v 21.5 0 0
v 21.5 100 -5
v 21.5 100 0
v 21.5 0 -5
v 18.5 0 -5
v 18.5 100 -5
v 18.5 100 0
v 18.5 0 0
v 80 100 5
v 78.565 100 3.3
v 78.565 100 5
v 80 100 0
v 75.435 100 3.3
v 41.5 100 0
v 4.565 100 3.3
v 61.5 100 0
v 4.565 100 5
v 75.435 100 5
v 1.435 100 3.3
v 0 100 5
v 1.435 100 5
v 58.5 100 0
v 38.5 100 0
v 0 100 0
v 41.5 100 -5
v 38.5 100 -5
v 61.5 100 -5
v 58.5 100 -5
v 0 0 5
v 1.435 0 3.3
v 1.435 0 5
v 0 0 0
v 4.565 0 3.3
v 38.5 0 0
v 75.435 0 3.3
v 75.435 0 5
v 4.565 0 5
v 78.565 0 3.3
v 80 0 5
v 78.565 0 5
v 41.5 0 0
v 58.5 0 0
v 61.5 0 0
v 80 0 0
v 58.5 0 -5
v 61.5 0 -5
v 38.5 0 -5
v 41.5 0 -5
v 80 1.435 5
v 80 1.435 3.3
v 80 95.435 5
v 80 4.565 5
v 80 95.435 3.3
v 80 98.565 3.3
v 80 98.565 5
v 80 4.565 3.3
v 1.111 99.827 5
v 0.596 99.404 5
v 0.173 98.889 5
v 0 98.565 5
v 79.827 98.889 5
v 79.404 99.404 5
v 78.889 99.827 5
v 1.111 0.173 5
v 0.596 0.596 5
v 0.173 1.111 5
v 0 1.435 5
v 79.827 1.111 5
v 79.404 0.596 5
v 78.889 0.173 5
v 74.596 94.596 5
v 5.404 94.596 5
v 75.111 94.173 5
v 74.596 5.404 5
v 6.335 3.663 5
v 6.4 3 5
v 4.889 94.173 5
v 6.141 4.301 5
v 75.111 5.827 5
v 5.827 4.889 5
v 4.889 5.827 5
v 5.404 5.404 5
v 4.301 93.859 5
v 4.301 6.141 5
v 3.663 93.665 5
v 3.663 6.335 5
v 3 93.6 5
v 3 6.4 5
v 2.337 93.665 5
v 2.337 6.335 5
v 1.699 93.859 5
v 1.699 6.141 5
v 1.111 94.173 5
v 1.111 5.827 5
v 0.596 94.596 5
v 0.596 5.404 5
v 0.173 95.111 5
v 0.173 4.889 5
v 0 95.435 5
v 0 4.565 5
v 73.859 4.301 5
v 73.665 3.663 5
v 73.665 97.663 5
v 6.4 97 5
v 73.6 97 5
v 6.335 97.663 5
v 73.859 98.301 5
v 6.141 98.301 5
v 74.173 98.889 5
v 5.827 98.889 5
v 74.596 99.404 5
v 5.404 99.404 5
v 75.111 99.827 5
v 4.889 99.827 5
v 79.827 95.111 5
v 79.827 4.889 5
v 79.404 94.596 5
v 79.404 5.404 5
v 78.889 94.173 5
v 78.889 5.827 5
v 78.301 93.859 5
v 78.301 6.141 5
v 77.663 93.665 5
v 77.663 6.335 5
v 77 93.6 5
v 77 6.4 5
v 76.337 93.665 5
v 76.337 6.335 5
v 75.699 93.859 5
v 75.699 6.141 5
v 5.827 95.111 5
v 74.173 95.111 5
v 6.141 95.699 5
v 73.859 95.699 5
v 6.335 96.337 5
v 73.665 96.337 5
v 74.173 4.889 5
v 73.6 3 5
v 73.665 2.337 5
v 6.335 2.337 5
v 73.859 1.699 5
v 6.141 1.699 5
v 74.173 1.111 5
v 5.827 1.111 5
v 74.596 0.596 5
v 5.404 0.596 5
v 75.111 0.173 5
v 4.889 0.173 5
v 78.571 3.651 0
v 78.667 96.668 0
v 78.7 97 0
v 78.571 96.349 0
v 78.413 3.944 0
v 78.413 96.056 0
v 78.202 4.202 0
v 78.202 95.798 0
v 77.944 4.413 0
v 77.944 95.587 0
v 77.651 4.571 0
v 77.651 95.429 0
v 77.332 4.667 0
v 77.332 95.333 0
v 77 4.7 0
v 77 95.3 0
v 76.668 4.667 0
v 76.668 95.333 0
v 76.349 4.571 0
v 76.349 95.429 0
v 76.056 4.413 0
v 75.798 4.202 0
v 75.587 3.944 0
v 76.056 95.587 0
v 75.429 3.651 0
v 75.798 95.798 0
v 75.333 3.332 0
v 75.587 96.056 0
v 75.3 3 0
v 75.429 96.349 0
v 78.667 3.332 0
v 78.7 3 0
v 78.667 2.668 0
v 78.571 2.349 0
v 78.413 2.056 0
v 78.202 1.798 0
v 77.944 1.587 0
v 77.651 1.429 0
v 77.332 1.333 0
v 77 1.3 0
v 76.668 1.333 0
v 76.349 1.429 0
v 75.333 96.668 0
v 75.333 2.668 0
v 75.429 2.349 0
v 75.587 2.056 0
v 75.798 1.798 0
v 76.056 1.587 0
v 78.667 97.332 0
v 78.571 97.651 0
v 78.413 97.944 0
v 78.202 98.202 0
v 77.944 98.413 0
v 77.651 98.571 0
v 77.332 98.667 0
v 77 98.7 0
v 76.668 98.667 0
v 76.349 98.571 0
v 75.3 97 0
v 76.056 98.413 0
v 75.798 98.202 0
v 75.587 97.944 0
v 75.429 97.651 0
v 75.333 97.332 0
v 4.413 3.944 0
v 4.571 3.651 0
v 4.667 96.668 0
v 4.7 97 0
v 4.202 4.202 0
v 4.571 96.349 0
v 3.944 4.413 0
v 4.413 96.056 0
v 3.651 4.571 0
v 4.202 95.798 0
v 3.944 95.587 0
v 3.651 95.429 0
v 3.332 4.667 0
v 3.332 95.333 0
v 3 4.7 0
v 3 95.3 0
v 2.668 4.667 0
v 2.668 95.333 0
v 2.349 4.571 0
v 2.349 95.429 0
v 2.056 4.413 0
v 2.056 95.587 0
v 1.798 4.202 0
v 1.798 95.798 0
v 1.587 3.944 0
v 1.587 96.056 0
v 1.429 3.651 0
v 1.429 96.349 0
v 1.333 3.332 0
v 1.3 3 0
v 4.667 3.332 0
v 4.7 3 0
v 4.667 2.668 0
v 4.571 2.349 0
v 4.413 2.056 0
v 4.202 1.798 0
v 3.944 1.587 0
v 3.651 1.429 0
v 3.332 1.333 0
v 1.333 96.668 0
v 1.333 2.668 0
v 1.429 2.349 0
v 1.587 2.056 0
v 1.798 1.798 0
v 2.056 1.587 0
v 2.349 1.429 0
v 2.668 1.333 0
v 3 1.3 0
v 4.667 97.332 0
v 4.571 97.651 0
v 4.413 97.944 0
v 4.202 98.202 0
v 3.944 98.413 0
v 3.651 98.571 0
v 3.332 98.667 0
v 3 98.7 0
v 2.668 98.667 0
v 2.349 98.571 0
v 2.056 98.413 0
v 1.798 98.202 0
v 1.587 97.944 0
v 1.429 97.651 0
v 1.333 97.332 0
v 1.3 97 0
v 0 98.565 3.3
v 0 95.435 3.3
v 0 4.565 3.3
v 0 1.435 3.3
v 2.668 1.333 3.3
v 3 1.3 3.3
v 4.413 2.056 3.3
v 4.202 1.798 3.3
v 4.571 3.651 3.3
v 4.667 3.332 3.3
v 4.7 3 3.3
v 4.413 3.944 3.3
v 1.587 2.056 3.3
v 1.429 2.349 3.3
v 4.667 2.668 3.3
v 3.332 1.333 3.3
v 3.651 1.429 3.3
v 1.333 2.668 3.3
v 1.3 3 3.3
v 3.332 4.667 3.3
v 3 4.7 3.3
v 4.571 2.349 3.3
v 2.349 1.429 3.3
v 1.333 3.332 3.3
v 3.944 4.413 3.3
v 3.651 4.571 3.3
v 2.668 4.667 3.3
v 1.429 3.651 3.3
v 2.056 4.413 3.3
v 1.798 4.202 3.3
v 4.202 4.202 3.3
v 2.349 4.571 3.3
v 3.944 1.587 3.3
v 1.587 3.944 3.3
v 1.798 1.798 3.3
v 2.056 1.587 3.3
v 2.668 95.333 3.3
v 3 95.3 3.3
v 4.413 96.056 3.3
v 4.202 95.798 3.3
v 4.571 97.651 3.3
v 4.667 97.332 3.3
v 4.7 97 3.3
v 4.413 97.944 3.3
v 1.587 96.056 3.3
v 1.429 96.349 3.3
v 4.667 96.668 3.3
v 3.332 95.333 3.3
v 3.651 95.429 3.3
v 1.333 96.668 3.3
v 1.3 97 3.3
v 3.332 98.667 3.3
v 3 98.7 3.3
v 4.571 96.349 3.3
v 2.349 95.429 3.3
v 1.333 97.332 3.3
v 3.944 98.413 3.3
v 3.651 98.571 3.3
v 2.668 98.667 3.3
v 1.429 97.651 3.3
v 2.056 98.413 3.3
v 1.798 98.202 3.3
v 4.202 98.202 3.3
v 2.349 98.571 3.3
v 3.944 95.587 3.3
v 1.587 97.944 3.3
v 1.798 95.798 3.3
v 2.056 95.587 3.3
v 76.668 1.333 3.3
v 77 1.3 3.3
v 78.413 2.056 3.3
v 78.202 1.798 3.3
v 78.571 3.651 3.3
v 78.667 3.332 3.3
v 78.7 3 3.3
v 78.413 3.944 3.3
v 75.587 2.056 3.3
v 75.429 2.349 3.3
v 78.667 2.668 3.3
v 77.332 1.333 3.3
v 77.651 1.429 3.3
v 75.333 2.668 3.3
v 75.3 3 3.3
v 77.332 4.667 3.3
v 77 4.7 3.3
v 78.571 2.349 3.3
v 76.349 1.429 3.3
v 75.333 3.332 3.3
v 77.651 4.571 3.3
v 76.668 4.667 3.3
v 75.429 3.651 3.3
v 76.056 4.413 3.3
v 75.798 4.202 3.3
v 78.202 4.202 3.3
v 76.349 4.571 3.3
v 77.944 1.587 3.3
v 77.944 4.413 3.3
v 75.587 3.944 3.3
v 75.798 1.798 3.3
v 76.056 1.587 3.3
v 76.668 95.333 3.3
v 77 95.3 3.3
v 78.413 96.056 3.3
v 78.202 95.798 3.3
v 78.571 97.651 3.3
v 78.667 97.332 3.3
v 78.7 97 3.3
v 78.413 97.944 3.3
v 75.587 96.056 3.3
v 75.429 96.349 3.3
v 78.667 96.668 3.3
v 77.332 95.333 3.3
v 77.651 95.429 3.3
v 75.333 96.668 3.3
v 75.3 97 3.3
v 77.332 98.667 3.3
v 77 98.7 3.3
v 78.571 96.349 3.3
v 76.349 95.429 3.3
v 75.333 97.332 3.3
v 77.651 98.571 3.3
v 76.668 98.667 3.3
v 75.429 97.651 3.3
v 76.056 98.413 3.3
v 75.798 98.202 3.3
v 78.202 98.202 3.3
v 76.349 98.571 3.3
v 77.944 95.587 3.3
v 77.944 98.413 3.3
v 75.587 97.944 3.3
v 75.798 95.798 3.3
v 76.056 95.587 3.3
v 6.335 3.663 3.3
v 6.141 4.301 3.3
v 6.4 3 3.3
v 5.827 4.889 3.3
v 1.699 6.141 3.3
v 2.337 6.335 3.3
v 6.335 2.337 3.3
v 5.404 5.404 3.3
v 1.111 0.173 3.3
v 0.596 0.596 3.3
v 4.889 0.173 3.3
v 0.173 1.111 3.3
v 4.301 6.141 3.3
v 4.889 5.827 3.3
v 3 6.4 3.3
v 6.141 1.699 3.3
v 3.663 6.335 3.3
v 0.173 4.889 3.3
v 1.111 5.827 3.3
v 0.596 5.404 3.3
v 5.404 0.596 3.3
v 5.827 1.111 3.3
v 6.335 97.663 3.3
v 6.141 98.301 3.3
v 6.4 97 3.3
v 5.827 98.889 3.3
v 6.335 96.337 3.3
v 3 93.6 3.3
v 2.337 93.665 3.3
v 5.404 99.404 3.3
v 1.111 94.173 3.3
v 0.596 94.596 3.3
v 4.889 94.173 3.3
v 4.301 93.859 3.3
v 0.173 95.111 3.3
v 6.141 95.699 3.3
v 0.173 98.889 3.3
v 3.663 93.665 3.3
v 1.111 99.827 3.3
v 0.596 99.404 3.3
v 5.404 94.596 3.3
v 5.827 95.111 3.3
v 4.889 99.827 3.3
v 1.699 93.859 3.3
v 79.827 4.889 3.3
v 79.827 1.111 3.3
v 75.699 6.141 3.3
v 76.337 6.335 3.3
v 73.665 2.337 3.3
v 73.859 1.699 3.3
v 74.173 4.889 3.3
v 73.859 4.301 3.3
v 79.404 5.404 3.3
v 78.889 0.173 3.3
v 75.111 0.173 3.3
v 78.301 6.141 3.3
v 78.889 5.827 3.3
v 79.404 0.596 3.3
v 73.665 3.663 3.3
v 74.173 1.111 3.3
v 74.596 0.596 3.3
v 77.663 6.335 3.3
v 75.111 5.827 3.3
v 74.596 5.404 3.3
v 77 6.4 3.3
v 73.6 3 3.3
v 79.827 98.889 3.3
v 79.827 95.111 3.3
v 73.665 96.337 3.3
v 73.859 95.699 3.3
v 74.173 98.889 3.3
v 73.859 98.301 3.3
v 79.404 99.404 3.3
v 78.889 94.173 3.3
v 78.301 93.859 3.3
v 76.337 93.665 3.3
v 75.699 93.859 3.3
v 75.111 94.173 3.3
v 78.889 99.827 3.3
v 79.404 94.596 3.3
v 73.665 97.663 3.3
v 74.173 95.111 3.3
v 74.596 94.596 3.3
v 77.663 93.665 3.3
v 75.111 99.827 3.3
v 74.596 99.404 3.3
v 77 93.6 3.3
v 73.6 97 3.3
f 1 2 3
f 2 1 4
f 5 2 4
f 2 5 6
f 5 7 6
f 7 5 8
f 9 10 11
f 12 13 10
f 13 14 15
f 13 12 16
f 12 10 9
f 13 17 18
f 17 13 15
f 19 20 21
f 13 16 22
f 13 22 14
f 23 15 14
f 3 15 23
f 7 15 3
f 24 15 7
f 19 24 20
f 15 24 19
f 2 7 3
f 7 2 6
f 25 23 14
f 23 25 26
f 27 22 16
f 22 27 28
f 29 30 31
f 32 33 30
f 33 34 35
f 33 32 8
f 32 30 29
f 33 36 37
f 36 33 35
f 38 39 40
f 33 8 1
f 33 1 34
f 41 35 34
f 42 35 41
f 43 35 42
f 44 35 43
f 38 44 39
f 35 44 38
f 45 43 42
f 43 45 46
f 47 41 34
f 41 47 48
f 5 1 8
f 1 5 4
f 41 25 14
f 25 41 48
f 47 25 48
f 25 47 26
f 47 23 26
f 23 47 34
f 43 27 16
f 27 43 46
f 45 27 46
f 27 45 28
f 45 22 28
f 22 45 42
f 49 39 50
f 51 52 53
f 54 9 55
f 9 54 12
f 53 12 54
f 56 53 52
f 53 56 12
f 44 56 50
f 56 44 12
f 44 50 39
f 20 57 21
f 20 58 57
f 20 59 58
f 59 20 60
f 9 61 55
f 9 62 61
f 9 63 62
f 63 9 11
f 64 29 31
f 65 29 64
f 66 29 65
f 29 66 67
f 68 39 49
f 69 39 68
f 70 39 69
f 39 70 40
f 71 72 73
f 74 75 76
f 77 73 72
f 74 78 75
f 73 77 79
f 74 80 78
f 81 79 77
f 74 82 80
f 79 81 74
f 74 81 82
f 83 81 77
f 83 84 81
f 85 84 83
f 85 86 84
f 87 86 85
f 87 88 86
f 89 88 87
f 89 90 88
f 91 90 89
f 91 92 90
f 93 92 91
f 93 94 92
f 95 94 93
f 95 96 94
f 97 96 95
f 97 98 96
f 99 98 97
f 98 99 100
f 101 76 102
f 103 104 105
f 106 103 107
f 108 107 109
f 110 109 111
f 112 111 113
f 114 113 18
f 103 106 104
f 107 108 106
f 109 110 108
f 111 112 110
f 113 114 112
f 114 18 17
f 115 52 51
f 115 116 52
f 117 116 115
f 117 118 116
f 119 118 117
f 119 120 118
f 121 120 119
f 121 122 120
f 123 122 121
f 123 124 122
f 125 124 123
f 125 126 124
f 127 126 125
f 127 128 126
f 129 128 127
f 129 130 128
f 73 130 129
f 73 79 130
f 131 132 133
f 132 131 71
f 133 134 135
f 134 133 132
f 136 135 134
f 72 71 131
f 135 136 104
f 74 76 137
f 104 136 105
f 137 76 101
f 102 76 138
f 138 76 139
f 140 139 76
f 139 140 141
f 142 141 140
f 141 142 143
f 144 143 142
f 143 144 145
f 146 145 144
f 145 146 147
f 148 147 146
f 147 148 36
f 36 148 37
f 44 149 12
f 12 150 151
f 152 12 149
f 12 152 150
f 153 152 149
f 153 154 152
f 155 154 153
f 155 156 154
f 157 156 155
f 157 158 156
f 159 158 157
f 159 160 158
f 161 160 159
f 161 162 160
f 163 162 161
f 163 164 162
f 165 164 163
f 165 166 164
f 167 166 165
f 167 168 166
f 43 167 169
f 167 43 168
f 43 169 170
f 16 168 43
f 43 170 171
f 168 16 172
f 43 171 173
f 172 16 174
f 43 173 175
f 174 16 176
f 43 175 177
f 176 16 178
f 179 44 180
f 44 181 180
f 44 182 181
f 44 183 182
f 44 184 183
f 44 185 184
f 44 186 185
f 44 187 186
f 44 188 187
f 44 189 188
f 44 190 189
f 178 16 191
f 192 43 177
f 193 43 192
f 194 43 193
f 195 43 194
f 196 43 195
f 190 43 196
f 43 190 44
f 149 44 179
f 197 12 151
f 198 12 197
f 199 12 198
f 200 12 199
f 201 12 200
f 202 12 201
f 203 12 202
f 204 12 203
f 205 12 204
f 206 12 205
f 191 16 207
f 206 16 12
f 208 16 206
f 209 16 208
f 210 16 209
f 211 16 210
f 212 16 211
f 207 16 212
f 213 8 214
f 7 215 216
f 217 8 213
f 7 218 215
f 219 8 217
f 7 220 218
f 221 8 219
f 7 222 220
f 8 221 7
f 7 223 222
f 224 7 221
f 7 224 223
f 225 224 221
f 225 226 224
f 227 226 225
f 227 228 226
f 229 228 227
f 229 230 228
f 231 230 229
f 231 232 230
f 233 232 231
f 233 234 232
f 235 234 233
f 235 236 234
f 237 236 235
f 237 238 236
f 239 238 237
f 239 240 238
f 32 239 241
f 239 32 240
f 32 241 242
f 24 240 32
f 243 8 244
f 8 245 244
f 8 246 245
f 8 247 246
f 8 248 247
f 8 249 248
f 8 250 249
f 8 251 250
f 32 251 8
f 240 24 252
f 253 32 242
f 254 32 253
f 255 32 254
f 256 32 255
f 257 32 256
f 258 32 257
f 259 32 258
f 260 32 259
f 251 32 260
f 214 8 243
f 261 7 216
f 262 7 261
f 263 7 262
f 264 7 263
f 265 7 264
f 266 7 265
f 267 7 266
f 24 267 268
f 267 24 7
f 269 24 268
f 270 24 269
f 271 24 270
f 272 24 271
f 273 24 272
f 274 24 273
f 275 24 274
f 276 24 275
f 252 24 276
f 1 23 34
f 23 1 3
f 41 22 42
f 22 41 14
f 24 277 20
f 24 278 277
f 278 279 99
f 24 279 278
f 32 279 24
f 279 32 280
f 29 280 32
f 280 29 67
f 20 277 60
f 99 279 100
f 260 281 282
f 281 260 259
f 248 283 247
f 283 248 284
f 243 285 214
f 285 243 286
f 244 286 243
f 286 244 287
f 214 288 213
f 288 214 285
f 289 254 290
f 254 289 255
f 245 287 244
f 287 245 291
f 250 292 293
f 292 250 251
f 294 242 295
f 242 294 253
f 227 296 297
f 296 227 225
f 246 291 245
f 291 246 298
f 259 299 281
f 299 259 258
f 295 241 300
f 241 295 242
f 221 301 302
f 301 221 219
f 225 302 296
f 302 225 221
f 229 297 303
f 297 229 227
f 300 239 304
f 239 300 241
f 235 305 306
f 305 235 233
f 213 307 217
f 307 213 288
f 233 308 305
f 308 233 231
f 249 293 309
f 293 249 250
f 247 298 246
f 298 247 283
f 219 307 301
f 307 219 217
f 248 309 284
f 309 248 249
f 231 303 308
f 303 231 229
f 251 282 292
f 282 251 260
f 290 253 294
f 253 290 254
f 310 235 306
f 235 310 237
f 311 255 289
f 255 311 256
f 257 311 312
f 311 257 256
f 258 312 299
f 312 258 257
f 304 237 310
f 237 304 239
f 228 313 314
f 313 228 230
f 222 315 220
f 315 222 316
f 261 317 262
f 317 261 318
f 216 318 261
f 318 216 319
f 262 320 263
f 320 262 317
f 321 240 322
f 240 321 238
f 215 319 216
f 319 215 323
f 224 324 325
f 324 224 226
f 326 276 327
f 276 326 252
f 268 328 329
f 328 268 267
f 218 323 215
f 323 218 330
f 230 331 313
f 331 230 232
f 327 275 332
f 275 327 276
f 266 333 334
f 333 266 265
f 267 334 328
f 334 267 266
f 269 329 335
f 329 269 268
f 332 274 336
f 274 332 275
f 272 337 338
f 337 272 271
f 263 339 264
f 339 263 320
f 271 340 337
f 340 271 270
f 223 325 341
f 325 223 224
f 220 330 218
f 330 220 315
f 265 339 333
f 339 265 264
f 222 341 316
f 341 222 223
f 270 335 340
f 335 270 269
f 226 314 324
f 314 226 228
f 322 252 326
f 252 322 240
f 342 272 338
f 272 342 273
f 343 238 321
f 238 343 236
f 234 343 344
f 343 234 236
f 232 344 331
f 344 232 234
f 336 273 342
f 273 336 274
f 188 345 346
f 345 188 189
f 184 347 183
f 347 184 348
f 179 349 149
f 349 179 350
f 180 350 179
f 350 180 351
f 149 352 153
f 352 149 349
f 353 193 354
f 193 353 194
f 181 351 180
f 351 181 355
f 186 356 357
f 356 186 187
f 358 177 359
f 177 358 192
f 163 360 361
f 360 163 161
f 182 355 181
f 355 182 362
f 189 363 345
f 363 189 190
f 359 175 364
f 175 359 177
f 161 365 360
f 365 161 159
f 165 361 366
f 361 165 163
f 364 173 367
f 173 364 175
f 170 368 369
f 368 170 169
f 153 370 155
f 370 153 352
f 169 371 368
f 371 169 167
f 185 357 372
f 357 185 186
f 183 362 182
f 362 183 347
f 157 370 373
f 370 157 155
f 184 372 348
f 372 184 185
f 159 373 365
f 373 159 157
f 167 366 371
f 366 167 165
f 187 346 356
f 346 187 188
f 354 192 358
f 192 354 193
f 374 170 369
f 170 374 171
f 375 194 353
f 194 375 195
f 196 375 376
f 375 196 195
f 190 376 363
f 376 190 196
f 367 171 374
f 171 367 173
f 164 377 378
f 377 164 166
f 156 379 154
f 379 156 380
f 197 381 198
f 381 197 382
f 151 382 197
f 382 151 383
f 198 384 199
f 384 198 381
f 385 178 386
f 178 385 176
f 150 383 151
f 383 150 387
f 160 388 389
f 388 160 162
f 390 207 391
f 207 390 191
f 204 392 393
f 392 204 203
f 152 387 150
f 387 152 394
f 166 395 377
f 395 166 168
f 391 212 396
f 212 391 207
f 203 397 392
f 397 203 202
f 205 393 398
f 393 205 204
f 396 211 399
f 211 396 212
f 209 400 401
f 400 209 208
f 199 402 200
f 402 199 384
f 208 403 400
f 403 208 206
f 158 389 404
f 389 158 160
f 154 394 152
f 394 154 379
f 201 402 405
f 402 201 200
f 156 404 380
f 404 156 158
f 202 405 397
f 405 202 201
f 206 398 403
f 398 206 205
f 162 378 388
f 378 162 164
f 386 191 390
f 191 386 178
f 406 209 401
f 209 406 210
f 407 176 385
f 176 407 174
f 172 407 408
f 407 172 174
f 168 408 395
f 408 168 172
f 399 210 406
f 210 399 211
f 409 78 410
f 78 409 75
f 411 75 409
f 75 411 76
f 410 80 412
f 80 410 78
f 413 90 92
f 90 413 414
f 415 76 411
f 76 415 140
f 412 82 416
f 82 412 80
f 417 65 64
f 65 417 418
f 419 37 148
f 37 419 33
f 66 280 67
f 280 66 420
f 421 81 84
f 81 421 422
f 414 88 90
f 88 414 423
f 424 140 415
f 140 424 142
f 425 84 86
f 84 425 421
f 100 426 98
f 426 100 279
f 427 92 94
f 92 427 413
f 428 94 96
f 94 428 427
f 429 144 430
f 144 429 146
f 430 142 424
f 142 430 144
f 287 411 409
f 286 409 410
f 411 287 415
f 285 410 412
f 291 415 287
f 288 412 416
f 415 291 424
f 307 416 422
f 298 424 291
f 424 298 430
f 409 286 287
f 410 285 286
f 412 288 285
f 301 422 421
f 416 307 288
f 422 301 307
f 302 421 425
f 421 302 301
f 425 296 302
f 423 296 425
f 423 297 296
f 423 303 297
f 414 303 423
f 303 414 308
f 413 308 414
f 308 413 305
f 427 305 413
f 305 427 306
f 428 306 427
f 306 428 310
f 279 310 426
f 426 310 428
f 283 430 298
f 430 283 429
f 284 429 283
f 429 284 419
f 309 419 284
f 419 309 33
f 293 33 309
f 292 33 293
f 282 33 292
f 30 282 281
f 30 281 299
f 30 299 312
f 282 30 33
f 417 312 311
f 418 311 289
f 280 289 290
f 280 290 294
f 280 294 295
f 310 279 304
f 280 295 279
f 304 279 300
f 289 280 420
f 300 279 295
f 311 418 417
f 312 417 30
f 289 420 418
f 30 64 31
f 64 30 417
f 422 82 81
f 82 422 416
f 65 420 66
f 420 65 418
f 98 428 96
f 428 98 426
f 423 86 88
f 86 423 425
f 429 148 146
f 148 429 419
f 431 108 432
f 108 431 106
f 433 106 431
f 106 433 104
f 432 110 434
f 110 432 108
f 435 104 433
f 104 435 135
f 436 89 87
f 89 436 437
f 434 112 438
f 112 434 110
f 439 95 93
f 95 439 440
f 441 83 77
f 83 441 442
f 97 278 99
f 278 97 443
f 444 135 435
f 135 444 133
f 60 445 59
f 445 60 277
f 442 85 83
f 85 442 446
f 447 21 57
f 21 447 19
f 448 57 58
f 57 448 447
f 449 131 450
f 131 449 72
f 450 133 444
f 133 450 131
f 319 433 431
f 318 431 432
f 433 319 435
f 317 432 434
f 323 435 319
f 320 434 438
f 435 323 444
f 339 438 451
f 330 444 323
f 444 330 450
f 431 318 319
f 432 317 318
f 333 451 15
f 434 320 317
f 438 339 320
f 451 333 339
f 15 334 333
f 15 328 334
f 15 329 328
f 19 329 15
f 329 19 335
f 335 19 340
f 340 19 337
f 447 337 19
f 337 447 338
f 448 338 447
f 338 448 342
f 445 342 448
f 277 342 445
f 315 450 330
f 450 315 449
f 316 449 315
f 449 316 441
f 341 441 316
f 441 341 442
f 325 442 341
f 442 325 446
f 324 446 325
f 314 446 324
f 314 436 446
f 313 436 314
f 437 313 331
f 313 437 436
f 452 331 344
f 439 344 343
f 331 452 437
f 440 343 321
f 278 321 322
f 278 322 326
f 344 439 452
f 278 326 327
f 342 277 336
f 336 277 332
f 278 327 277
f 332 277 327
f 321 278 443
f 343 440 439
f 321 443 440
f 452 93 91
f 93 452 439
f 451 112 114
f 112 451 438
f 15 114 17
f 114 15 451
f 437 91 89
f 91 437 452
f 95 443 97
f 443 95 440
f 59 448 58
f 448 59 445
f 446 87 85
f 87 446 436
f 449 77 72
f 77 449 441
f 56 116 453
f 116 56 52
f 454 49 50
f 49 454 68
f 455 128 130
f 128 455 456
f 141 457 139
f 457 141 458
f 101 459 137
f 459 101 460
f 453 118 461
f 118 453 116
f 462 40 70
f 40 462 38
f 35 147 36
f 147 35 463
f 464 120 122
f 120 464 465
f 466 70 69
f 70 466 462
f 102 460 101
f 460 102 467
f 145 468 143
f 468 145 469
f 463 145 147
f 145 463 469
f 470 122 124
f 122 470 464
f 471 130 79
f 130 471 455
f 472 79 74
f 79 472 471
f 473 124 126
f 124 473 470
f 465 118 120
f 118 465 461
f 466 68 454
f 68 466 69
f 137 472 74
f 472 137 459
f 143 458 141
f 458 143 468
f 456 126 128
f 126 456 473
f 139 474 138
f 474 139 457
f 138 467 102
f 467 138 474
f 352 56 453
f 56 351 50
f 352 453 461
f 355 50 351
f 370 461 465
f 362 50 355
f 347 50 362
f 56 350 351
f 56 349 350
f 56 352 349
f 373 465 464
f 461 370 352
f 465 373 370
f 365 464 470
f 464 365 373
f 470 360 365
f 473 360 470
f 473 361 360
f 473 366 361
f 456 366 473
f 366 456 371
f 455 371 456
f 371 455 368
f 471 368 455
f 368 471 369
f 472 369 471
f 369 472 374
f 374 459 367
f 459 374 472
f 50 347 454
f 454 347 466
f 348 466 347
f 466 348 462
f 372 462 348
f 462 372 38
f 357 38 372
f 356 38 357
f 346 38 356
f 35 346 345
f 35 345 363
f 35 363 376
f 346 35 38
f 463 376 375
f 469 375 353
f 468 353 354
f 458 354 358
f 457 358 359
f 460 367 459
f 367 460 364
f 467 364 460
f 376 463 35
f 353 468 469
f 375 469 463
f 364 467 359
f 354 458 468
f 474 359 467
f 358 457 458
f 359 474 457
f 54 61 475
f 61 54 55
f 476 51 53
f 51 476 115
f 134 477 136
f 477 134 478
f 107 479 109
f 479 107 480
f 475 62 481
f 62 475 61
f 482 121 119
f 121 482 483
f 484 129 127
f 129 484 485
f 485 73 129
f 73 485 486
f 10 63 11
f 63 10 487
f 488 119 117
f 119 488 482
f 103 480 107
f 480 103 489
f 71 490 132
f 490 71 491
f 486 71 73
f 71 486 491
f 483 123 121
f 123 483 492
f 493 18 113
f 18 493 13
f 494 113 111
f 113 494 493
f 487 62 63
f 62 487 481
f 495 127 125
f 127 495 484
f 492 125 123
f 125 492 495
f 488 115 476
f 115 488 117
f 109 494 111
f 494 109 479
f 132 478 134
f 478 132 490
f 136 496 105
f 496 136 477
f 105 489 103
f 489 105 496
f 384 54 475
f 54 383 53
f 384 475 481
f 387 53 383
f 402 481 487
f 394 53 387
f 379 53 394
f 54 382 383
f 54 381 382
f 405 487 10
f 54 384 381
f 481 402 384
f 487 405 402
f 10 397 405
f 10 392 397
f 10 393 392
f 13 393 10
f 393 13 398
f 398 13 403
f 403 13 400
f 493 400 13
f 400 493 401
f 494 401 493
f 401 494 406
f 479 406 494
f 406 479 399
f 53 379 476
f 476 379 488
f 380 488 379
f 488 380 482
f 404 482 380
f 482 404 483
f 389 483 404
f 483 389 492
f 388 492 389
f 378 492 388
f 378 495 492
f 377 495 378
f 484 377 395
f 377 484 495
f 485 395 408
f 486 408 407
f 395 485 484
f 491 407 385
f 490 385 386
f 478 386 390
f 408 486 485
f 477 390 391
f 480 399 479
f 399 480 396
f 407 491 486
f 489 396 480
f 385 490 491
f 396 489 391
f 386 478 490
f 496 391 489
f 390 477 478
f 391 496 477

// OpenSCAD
$fn = 32;

// ----------------------------------------------------------------------
// Enclosure lid: 80 x 100 x 5 mm, 4 bolt holes
// ----------------------------------------------------------------------

// --- parameters (mm) ---
length = 80;              // lid length, X
width = 100;              // lid width, Y
plate_t = 5;              // lid plate thickness
bolt_d = 3.4;             // bolt clearance
boss_lip = 3;             // bolt hole inset from the corner
sink = 1;                 // overlap of the lip and ribs into the plate
cs_d = 6.8;               // countersink diameter
cs_h = 1.7;               // countersink depth
rib_n = 3;                // stiffening ribs
rib_t = 3;                // rib thickness
rib_h = 6;                // rib height below the plate

module plate() {
  cube([length, width, plate_t]);
  /* stiffening ribs under the plate */
  for (i = [1 : rib_n]) translate([length * i / (rib_n + 1) - rib_t / 2, 0, -rib_h + sink]) cube([rib_t, width - 2 * 0, rib_h]);
}

difference() {
  plate();
  /* bolt pattern matching the corner bosses */
  for (sx = [0, 1]) for (sy = [0, 1])
    translate([sx * (length - 2 * boss_lip) + boss_lip, sy * (width - 2 * boss_lip) + boss_lip, -0 - 1])
      cylinder(h = plate_t + 0 + 2, d = bolt_d);
  /* countersinks so the heads sit flush */
  for (sx = [0, 1]) for (sy = [0, 1])
    translate([sx * (length - 2 * boss_lip) + boss_lip, sy * (width - 2 * boss_lip) + boss_lip, plate_t - cs_h])
      cylinder(h = cs_h + 0.5, d = cs_d);
}
